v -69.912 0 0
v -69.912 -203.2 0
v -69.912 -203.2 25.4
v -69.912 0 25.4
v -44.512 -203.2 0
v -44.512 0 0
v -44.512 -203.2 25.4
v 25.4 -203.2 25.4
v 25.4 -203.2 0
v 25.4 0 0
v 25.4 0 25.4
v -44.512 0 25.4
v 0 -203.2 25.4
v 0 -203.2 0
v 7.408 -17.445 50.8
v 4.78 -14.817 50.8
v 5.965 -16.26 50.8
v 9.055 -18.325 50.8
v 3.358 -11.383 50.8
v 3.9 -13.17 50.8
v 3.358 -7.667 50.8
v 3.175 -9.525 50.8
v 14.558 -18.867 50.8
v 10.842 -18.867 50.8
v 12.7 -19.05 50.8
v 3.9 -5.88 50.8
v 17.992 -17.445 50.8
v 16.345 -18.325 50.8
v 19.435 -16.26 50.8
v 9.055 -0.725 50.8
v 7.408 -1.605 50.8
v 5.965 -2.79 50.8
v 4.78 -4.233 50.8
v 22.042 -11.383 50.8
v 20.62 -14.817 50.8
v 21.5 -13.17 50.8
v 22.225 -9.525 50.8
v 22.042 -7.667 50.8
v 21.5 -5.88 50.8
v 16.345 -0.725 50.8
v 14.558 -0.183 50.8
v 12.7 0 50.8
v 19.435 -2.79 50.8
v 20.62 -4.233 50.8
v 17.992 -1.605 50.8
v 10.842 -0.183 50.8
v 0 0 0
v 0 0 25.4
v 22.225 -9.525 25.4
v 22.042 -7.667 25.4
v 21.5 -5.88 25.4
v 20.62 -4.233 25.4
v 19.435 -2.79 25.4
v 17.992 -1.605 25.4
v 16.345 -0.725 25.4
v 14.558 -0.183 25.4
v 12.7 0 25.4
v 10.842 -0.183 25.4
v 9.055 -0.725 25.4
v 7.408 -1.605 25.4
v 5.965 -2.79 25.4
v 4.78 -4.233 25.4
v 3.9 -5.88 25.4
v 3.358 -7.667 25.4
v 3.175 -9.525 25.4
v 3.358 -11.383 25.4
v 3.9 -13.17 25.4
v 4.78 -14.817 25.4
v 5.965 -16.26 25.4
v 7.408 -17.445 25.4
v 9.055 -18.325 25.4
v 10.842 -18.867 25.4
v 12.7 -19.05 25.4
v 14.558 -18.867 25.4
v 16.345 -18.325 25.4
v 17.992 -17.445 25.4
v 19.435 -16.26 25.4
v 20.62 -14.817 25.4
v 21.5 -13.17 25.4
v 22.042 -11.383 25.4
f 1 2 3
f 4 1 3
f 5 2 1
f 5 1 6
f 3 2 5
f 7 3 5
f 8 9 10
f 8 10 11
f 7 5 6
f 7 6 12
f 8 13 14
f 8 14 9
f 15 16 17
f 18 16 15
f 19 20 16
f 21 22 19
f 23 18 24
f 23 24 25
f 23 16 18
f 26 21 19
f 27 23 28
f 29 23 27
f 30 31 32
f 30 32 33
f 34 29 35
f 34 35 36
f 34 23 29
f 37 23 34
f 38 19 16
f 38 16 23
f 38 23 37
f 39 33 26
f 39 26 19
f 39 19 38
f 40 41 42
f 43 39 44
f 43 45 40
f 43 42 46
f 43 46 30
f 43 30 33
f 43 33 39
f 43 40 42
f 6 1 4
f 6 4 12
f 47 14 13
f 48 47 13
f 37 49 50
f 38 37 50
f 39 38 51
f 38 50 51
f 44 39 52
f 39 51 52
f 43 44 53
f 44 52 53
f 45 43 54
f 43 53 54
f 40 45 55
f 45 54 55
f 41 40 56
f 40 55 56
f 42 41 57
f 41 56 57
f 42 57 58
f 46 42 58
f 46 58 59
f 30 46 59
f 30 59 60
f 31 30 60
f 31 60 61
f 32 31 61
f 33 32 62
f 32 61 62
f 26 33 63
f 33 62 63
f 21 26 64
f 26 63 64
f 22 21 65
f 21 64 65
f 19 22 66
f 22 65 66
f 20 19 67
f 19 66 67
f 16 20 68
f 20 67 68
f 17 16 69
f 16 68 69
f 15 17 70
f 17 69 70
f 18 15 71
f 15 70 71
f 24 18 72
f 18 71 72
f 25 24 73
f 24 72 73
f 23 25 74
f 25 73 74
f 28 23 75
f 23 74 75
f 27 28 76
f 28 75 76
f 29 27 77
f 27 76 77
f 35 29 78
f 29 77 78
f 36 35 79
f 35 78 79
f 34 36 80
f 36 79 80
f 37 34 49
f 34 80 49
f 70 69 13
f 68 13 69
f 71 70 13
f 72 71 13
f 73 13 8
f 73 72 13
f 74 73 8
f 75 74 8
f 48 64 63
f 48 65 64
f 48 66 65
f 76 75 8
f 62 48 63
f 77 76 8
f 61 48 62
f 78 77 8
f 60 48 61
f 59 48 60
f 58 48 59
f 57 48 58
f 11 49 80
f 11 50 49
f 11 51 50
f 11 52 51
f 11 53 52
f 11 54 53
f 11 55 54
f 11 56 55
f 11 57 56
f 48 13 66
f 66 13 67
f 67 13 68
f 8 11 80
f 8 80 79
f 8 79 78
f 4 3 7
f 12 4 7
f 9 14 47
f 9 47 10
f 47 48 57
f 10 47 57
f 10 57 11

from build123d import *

# Parameters (mm, degrees)
F0_W     = 25.4
F0_H     = 25.4
F1_DEPTH = 203.2
F2_W     = 25.4
F2_H     = 25.4
F3_DEPTH = 203.2
F4_R     = 9.525
F5_DEPTH = 25.4


with BuildPart() as f1:
    # F0 (on Front) → F1 (new body)
    with BuildSketch(Plane.XZ):
        with Locations((12.7, 12.7)):
            Rectangle(F0_W, F0_H)
    extrude(amount=F1_DEPTH)

    # F4 (on face) → F5 (join)
    with BuildSketch(Plane.XY.offset(25.4)):
        with Locations((12.7, -9.525)):
            Circle(F4_R)
    extrude(amount=F5_DEPTH)


with BuildPart() as f3:
    # F2 (on Front) → F3 (new body)
    with BuildSketch(Plane.XZ):
        with Locations((-57.21218, 12.7)):
            Rectangle(F2_W, F2_H)
    extrude(amount=F3_DEPTH)


solid = Compound([f1.part, f3.part])
